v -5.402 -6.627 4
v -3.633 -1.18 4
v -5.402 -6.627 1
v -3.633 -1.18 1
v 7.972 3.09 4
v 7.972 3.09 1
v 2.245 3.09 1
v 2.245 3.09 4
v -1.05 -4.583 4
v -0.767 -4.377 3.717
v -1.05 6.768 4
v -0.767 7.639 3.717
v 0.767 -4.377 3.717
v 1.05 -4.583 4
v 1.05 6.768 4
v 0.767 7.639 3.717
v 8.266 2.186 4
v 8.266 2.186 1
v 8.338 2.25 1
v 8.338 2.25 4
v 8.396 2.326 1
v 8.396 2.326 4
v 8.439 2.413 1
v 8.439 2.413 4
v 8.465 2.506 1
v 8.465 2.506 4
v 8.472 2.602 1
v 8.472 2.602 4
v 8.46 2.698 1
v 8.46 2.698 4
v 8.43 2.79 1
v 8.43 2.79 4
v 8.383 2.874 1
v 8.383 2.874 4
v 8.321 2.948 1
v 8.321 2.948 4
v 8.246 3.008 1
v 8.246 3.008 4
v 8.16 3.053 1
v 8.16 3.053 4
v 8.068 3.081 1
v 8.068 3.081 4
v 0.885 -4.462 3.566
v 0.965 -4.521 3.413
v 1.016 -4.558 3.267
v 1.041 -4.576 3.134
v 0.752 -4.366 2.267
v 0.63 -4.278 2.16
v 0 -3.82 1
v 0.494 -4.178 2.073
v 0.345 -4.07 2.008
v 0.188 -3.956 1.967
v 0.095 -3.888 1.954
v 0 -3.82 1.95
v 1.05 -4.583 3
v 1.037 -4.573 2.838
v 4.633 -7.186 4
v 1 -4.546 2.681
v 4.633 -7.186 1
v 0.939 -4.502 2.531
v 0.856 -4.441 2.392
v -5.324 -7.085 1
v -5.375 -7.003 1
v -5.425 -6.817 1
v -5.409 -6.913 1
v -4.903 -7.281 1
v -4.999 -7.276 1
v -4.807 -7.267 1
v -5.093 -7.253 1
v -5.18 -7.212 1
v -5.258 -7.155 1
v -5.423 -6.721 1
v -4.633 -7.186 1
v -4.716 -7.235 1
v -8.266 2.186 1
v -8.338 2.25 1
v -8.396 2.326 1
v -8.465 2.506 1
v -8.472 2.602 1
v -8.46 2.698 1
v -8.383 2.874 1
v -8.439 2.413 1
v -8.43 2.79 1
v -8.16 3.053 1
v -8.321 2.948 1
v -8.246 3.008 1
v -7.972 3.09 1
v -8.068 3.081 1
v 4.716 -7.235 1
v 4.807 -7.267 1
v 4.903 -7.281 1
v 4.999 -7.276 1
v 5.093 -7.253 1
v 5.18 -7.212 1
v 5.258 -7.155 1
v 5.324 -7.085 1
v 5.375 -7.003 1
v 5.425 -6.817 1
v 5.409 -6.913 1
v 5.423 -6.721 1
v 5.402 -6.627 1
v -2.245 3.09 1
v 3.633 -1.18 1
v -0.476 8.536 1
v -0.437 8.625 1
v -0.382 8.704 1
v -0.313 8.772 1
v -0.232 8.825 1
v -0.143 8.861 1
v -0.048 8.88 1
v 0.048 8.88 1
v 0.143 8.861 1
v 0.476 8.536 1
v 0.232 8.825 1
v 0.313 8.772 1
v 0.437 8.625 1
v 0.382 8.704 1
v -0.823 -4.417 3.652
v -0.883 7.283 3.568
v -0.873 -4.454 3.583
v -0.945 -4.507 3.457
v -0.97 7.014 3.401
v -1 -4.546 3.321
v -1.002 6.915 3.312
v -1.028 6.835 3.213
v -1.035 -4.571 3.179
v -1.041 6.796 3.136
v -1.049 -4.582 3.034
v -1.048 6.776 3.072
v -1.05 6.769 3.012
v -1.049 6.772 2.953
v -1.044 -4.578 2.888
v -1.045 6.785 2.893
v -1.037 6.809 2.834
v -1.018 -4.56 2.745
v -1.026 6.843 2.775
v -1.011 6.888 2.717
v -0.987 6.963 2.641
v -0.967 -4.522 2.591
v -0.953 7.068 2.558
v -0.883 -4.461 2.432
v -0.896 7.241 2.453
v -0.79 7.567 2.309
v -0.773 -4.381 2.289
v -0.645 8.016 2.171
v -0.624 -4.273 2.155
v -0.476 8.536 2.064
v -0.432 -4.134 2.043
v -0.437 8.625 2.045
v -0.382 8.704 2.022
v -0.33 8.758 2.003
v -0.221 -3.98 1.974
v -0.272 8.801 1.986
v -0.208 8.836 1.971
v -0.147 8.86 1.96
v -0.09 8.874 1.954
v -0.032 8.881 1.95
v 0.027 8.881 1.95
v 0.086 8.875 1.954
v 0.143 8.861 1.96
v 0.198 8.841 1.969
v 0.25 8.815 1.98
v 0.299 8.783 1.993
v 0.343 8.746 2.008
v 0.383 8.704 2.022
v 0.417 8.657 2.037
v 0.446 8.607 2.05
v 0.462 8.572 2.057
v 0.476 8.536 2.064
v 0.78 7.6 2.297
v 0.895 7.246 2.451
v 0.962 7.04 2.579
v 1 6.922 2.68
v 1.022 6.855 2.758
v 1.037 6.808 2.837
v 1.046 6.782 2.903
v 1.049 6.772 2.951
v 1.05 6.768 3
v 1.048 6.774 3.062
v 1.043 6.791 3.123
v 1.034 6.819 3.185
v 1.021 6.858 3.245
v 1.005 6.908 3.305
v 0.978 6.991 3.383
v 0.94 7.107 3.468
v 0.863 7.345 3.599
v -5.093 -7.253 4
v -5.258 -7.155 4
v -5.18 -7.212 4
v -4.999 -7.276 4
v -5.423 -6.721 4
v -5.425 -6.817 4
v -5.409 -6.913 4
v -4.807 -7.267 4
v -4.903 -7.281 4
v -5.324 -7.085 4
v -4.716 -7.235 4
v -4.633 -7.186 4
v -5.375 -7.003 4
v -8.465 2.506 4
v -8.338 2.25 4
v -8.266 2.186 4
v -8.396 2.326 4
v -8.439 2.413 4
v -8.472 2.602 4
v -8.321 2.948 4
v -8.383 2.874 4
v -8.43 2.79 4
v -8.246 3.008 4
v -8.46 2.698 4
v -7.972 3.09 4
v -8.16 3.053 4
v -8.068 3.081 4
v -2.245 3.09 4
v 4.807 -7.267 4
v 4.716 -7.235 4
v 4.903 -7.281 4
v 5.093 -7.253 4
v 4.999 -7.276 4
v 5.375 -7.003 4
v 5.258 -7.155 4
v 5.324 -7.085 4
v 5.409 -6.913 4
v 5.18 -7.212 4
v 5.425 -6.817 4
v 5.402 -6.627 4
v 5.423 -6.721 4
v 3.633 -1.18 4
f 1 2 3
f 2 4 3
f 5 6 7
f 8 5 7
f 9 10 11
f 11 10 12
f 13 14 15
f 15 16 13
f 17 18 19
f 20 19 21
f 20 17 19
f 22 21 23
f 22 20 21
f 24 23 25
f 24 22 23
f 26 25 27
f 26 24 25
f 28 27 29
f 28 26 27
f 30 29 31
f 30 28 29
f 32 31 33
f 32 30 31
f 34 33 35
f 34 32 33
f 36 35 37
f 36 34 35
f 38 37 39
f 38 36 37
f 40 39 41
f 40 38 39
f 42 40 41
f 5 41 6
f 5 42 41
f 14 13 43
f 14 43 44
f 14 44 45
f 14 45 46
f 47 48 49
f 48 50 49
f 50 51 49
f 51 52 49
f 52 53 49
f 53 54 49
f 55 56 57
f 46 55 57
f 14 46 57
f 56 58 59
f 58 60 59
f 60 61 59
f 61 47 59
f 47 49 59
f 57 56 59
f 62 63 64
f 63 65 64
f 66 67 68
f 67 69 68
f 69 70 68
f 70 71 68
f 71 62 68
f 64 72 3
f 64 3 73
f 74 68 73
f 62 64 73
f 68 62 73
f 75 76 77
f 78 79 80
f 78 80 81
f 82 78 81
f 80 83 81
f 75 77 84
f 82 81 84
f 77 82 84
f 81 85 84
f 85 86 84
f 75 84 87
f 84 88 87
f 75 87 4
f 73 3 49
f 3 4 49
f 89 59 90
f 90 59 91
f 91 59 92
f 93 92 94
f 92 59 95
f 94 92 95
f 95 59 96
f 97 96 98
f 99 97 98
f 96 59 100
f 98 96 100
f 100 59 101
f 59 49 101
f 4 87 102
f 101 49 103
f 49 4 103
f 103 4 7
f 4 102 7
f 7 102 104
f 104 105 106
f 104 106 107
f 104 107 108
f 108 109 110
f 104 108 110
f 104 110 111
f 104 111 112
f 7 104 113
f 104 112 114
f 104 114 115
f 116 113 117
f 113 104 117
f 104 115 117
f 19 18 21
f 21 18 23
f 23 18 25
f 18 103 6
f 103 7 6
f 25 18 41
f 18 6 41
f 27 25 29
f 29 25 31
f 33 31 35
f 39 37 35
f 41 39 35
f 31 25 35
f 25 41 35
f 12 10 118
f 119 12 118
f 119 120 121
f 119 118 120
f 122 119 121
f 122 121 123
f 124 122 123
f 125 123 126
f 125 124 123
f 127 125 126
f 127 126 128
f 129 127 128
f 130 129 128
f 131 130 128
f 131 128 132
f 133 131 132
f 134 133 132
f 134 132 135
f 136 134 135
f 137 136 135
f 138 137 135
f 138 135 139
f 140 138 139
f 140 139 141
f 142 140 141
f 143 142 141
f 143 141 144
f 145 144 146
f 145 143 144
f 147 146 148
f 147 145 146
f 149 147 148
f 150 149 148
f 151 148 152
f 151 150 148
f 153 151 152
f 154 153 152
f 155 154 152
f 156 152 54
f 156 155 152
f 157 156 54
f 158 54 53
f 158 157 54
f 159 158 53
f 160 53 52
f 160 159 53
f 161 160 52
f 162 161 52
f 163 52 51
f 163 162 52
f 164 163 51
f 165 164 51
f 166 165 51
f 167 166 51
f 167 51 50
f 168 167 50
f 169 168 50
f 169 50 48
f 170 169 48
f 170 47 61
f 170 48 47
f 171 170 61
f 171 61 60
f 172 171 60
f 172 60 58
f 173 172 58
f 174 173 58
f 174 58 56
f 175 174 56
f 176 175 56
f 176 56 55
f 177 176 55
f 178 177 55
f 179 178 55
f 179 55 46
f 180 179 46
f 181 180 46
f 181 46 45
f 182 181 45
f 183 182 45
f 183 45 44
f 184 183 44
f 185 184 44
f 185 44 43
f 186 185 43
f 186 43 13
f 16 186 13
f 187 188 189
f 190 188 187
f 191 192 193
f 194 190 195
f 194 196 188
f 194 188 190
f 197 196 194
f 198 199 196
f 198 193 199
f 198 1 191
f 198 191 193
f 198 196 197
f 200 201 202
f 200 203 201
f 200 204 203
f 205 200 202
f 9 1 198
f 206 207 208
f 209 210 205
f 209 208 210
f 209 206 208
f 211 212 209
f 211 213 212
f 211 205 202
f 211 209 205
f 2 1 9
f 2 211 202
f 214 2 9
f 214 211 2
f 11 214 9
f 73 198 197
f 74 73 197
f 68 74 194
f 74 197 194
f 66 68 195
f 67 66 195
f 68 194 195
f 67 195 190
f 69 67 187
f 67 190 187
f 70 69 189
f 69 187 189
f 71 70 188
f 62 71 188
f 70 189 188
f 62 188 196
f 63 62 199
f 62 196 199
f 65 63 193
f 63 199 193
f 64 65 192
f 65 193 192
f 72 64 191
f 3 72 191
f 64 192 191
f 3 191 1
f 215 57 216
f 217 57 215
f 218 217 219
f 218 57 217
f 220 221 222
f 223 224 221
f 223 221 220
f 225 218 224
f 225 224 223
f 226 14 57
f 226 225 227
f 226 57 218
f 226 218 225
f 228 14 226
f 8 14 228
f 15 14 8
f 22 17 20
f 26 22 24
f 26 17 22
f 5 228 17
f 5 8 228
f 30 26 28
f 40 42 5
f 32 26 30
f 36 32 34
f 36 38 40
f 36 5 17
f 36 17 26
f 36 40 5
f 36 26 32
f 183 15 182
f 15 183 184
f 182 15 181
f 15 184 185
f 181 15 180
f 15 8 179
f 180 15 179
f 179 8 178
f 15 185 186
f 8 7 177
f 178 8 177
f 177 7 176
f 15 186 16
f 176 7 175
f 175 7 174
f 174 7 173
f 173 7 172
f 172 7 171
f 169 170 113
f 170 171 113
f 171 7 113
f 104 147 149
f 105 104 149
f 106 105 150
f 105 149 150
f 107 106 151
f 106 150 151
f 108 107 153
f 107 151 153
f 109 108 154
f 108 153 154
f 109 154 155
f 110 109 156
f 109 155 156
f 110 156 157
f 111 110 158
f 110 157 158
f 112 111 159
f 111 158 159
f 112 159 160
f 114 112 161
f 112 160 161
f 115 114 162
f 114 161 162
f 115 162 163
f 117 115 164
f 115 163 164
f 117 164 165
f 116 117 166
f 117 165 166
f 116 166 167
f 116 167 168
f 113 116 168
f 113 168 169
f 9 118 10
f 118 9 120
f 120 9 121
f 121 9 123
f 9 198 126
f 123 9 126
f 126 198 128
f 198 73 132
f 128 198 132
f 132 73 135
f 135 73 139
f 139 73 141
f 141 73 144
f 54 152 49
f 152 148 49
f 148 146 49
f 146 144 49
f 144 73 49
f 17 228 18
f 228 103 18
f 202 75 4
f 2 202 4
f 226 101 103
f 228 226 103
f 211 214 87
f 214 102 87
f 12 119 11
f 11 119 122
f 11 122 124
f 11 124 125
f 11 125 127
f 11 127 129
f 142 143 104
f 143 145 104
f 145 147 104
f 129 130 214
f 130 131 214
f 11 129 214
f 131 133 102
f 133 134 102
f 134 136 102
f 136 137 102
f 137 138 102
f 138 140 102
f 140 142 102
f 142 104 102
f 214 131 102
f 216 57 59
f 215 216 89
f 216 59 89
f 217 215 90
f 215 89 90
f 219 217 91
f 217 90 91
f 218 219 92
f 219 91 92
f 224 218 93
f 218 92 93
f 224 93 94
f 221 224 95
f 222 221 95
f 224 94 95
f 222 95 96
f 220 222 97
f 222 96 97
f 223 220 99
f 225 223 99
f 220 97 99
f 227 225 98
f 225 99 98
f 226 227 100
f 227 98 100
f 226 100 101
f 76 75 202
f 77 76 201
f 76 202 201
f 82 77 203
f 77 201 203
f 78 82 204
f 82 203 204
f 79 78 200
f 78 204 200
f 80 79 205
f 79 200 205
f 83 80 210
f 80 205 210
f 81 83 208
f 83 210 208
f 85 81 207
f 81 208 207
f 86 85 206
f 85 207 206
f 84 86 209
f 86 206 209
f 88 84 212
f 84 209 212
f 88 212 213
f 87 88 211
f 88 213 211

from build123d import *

# Parameters (mm, degrees)
F1_DEPTH      = 3
F2_W          = 4
F2_H          = 6.1803398875
F3_DEPTH      = 1
F5_DEPTH      = 10.001
F5_DEPTH_BACK = 8.0911699437
F6_R          = 0.5
F7_T1_DEPTH   = 13.5993141484
F8_DEPTH      = 1


# Not quite as in the source:
# - a fillet or chamfer that OpenCascade refuses, or shapes differently, is made with other operations: its cross-section is extruded or revolved along the edge and cut away or added


with BuildPart() as f1:
    # F0 (on Top) → F1 (new body)
    with BuildSketch(Plane.XY):
        Polygon((3.63271264, -1.1803398875), (9.510565163, 3.0901699437), (2.2451398829, 3.0901699437), align=None)
        Polygon((3.63271264, -1.1803398875), (2.2451398829, 3.0901699437), (-2.2451398829, 3.0901699437), (-3.63271264, -1.1803398875), (0, -3.8196601125), align=None)
        Polygon((-2.2451398829, 3.0901699437), (2.2451398829, 3.0901699437), (0, 10), align=None)
        Polygon((5.8778525229, -8.0901699437), (3.63271264, -1.1803398875), (0, -3.8196601125), align=None)
        Polygon((-3.63271264, -1.1803398875), (-2.2451398829, 3.0901699437), (-9.510565163, 3.0901699437), align=None)
        Polygon((-5.8778525229, -8.0901699437), (0, -3.8196601125), (-3.63271264, -1.1803398875), align=None)
    extrude(amount=F1_DEPTH)

    # F2 (on face) → F3 (join)
    with BuildSketch(Plane.XY.offset(3)):
        Polygon((3.63271264, -1.1803398875), (9.510565163, 3.0901699437), (2.2451398829, 3.0901699437), (0, 10), (-2.2451398829, 3.0901699437), (-9.510565163, 3.0901699437), (-3.63271264, -1.1803398875), (-5.8778525229, -8.0901699437), (0, -3.8196601125), (5.8778525229, -8.0901699437), align=None)
        Rectangle(F2_W, F2_H, mode=Mode.SUBTRACT)
        Rectangle(F2_W, F2_H)
    extrude(amount=F3_DEPTH)

    # F4 (on Front) → F5 (cut, two sides)
    with BuildSketch(Plane.XZ) as f5_sk:
        with BuildLine():
            ThreePointArc((-0.75, 3.7348469228), (-0.3968626967, 2.0278888952), (1.05, 3))
            ThreePointArc((1.05, 3), (0.9721111048, 3.3968626967), (0.75, 3.7348469228))
            ThreePointArc((0.75, 3.7348469228), (0, 4.05), (-0.75, 3.7348469228))
        make_face()
        with BuildLine():
            ThreePointArc((-0.75, 3.7348469228), (0, 4.05), (0.75, 3.7348469228))
            Line((0.75, 3.7348469228), (0.75, 5))
            Line((0.75, 5), (-0.75, 5))
            Line((-0.75, 5), (-0.75, 3.7348469228))
        make_face()
    extrude(amount=-F5_DEPTH, mode=Mode.SUBTRACT)
    extrude(f5_sk.sketch, amount=F5_DEPTH_BACK, mode=Mode.SUBTRACT)

    # F6
    f6_edges = [f1.edges().sort_by_distance(p)[0] for p in [
        (5.877853, -8.09017, 2),
        (9.510565, 3.09017, 2),
        (0, 10, 0.975),
        (-9.510565, 3.09017, 2),
        (-5.877853, -8.09017, 2),
    ]]
    fillet(f6_edges, radius=F6_R)

    # F7: chamfer of 0.3 on 2 edges, made by hand

    # F7_s2 → F7_t1 (cut)
    with BuildSketch(Plane.XZ.offset(-8.4632422435)):
        Polygon((-0.75, 3.7), (-1.05, 4), (-0.75, 4), align=None)
        Polygon((1.05, 4), (0.75, 3.7), (0.75, 4), align=None)
    extrude(amount=F7_T1_DEPTH, mode=Mode.SUBTRACT)

    # F8 (cut): a face of the model
    f8_faces = [f1.faces().sort_by_distance(p)[0] for p in [
        (0, 0, 0),
    ]]
    extrude(f8_faces, amount=-F8_DEPTH, mode=Mode.SUBTRACT)


solid = f1.part
